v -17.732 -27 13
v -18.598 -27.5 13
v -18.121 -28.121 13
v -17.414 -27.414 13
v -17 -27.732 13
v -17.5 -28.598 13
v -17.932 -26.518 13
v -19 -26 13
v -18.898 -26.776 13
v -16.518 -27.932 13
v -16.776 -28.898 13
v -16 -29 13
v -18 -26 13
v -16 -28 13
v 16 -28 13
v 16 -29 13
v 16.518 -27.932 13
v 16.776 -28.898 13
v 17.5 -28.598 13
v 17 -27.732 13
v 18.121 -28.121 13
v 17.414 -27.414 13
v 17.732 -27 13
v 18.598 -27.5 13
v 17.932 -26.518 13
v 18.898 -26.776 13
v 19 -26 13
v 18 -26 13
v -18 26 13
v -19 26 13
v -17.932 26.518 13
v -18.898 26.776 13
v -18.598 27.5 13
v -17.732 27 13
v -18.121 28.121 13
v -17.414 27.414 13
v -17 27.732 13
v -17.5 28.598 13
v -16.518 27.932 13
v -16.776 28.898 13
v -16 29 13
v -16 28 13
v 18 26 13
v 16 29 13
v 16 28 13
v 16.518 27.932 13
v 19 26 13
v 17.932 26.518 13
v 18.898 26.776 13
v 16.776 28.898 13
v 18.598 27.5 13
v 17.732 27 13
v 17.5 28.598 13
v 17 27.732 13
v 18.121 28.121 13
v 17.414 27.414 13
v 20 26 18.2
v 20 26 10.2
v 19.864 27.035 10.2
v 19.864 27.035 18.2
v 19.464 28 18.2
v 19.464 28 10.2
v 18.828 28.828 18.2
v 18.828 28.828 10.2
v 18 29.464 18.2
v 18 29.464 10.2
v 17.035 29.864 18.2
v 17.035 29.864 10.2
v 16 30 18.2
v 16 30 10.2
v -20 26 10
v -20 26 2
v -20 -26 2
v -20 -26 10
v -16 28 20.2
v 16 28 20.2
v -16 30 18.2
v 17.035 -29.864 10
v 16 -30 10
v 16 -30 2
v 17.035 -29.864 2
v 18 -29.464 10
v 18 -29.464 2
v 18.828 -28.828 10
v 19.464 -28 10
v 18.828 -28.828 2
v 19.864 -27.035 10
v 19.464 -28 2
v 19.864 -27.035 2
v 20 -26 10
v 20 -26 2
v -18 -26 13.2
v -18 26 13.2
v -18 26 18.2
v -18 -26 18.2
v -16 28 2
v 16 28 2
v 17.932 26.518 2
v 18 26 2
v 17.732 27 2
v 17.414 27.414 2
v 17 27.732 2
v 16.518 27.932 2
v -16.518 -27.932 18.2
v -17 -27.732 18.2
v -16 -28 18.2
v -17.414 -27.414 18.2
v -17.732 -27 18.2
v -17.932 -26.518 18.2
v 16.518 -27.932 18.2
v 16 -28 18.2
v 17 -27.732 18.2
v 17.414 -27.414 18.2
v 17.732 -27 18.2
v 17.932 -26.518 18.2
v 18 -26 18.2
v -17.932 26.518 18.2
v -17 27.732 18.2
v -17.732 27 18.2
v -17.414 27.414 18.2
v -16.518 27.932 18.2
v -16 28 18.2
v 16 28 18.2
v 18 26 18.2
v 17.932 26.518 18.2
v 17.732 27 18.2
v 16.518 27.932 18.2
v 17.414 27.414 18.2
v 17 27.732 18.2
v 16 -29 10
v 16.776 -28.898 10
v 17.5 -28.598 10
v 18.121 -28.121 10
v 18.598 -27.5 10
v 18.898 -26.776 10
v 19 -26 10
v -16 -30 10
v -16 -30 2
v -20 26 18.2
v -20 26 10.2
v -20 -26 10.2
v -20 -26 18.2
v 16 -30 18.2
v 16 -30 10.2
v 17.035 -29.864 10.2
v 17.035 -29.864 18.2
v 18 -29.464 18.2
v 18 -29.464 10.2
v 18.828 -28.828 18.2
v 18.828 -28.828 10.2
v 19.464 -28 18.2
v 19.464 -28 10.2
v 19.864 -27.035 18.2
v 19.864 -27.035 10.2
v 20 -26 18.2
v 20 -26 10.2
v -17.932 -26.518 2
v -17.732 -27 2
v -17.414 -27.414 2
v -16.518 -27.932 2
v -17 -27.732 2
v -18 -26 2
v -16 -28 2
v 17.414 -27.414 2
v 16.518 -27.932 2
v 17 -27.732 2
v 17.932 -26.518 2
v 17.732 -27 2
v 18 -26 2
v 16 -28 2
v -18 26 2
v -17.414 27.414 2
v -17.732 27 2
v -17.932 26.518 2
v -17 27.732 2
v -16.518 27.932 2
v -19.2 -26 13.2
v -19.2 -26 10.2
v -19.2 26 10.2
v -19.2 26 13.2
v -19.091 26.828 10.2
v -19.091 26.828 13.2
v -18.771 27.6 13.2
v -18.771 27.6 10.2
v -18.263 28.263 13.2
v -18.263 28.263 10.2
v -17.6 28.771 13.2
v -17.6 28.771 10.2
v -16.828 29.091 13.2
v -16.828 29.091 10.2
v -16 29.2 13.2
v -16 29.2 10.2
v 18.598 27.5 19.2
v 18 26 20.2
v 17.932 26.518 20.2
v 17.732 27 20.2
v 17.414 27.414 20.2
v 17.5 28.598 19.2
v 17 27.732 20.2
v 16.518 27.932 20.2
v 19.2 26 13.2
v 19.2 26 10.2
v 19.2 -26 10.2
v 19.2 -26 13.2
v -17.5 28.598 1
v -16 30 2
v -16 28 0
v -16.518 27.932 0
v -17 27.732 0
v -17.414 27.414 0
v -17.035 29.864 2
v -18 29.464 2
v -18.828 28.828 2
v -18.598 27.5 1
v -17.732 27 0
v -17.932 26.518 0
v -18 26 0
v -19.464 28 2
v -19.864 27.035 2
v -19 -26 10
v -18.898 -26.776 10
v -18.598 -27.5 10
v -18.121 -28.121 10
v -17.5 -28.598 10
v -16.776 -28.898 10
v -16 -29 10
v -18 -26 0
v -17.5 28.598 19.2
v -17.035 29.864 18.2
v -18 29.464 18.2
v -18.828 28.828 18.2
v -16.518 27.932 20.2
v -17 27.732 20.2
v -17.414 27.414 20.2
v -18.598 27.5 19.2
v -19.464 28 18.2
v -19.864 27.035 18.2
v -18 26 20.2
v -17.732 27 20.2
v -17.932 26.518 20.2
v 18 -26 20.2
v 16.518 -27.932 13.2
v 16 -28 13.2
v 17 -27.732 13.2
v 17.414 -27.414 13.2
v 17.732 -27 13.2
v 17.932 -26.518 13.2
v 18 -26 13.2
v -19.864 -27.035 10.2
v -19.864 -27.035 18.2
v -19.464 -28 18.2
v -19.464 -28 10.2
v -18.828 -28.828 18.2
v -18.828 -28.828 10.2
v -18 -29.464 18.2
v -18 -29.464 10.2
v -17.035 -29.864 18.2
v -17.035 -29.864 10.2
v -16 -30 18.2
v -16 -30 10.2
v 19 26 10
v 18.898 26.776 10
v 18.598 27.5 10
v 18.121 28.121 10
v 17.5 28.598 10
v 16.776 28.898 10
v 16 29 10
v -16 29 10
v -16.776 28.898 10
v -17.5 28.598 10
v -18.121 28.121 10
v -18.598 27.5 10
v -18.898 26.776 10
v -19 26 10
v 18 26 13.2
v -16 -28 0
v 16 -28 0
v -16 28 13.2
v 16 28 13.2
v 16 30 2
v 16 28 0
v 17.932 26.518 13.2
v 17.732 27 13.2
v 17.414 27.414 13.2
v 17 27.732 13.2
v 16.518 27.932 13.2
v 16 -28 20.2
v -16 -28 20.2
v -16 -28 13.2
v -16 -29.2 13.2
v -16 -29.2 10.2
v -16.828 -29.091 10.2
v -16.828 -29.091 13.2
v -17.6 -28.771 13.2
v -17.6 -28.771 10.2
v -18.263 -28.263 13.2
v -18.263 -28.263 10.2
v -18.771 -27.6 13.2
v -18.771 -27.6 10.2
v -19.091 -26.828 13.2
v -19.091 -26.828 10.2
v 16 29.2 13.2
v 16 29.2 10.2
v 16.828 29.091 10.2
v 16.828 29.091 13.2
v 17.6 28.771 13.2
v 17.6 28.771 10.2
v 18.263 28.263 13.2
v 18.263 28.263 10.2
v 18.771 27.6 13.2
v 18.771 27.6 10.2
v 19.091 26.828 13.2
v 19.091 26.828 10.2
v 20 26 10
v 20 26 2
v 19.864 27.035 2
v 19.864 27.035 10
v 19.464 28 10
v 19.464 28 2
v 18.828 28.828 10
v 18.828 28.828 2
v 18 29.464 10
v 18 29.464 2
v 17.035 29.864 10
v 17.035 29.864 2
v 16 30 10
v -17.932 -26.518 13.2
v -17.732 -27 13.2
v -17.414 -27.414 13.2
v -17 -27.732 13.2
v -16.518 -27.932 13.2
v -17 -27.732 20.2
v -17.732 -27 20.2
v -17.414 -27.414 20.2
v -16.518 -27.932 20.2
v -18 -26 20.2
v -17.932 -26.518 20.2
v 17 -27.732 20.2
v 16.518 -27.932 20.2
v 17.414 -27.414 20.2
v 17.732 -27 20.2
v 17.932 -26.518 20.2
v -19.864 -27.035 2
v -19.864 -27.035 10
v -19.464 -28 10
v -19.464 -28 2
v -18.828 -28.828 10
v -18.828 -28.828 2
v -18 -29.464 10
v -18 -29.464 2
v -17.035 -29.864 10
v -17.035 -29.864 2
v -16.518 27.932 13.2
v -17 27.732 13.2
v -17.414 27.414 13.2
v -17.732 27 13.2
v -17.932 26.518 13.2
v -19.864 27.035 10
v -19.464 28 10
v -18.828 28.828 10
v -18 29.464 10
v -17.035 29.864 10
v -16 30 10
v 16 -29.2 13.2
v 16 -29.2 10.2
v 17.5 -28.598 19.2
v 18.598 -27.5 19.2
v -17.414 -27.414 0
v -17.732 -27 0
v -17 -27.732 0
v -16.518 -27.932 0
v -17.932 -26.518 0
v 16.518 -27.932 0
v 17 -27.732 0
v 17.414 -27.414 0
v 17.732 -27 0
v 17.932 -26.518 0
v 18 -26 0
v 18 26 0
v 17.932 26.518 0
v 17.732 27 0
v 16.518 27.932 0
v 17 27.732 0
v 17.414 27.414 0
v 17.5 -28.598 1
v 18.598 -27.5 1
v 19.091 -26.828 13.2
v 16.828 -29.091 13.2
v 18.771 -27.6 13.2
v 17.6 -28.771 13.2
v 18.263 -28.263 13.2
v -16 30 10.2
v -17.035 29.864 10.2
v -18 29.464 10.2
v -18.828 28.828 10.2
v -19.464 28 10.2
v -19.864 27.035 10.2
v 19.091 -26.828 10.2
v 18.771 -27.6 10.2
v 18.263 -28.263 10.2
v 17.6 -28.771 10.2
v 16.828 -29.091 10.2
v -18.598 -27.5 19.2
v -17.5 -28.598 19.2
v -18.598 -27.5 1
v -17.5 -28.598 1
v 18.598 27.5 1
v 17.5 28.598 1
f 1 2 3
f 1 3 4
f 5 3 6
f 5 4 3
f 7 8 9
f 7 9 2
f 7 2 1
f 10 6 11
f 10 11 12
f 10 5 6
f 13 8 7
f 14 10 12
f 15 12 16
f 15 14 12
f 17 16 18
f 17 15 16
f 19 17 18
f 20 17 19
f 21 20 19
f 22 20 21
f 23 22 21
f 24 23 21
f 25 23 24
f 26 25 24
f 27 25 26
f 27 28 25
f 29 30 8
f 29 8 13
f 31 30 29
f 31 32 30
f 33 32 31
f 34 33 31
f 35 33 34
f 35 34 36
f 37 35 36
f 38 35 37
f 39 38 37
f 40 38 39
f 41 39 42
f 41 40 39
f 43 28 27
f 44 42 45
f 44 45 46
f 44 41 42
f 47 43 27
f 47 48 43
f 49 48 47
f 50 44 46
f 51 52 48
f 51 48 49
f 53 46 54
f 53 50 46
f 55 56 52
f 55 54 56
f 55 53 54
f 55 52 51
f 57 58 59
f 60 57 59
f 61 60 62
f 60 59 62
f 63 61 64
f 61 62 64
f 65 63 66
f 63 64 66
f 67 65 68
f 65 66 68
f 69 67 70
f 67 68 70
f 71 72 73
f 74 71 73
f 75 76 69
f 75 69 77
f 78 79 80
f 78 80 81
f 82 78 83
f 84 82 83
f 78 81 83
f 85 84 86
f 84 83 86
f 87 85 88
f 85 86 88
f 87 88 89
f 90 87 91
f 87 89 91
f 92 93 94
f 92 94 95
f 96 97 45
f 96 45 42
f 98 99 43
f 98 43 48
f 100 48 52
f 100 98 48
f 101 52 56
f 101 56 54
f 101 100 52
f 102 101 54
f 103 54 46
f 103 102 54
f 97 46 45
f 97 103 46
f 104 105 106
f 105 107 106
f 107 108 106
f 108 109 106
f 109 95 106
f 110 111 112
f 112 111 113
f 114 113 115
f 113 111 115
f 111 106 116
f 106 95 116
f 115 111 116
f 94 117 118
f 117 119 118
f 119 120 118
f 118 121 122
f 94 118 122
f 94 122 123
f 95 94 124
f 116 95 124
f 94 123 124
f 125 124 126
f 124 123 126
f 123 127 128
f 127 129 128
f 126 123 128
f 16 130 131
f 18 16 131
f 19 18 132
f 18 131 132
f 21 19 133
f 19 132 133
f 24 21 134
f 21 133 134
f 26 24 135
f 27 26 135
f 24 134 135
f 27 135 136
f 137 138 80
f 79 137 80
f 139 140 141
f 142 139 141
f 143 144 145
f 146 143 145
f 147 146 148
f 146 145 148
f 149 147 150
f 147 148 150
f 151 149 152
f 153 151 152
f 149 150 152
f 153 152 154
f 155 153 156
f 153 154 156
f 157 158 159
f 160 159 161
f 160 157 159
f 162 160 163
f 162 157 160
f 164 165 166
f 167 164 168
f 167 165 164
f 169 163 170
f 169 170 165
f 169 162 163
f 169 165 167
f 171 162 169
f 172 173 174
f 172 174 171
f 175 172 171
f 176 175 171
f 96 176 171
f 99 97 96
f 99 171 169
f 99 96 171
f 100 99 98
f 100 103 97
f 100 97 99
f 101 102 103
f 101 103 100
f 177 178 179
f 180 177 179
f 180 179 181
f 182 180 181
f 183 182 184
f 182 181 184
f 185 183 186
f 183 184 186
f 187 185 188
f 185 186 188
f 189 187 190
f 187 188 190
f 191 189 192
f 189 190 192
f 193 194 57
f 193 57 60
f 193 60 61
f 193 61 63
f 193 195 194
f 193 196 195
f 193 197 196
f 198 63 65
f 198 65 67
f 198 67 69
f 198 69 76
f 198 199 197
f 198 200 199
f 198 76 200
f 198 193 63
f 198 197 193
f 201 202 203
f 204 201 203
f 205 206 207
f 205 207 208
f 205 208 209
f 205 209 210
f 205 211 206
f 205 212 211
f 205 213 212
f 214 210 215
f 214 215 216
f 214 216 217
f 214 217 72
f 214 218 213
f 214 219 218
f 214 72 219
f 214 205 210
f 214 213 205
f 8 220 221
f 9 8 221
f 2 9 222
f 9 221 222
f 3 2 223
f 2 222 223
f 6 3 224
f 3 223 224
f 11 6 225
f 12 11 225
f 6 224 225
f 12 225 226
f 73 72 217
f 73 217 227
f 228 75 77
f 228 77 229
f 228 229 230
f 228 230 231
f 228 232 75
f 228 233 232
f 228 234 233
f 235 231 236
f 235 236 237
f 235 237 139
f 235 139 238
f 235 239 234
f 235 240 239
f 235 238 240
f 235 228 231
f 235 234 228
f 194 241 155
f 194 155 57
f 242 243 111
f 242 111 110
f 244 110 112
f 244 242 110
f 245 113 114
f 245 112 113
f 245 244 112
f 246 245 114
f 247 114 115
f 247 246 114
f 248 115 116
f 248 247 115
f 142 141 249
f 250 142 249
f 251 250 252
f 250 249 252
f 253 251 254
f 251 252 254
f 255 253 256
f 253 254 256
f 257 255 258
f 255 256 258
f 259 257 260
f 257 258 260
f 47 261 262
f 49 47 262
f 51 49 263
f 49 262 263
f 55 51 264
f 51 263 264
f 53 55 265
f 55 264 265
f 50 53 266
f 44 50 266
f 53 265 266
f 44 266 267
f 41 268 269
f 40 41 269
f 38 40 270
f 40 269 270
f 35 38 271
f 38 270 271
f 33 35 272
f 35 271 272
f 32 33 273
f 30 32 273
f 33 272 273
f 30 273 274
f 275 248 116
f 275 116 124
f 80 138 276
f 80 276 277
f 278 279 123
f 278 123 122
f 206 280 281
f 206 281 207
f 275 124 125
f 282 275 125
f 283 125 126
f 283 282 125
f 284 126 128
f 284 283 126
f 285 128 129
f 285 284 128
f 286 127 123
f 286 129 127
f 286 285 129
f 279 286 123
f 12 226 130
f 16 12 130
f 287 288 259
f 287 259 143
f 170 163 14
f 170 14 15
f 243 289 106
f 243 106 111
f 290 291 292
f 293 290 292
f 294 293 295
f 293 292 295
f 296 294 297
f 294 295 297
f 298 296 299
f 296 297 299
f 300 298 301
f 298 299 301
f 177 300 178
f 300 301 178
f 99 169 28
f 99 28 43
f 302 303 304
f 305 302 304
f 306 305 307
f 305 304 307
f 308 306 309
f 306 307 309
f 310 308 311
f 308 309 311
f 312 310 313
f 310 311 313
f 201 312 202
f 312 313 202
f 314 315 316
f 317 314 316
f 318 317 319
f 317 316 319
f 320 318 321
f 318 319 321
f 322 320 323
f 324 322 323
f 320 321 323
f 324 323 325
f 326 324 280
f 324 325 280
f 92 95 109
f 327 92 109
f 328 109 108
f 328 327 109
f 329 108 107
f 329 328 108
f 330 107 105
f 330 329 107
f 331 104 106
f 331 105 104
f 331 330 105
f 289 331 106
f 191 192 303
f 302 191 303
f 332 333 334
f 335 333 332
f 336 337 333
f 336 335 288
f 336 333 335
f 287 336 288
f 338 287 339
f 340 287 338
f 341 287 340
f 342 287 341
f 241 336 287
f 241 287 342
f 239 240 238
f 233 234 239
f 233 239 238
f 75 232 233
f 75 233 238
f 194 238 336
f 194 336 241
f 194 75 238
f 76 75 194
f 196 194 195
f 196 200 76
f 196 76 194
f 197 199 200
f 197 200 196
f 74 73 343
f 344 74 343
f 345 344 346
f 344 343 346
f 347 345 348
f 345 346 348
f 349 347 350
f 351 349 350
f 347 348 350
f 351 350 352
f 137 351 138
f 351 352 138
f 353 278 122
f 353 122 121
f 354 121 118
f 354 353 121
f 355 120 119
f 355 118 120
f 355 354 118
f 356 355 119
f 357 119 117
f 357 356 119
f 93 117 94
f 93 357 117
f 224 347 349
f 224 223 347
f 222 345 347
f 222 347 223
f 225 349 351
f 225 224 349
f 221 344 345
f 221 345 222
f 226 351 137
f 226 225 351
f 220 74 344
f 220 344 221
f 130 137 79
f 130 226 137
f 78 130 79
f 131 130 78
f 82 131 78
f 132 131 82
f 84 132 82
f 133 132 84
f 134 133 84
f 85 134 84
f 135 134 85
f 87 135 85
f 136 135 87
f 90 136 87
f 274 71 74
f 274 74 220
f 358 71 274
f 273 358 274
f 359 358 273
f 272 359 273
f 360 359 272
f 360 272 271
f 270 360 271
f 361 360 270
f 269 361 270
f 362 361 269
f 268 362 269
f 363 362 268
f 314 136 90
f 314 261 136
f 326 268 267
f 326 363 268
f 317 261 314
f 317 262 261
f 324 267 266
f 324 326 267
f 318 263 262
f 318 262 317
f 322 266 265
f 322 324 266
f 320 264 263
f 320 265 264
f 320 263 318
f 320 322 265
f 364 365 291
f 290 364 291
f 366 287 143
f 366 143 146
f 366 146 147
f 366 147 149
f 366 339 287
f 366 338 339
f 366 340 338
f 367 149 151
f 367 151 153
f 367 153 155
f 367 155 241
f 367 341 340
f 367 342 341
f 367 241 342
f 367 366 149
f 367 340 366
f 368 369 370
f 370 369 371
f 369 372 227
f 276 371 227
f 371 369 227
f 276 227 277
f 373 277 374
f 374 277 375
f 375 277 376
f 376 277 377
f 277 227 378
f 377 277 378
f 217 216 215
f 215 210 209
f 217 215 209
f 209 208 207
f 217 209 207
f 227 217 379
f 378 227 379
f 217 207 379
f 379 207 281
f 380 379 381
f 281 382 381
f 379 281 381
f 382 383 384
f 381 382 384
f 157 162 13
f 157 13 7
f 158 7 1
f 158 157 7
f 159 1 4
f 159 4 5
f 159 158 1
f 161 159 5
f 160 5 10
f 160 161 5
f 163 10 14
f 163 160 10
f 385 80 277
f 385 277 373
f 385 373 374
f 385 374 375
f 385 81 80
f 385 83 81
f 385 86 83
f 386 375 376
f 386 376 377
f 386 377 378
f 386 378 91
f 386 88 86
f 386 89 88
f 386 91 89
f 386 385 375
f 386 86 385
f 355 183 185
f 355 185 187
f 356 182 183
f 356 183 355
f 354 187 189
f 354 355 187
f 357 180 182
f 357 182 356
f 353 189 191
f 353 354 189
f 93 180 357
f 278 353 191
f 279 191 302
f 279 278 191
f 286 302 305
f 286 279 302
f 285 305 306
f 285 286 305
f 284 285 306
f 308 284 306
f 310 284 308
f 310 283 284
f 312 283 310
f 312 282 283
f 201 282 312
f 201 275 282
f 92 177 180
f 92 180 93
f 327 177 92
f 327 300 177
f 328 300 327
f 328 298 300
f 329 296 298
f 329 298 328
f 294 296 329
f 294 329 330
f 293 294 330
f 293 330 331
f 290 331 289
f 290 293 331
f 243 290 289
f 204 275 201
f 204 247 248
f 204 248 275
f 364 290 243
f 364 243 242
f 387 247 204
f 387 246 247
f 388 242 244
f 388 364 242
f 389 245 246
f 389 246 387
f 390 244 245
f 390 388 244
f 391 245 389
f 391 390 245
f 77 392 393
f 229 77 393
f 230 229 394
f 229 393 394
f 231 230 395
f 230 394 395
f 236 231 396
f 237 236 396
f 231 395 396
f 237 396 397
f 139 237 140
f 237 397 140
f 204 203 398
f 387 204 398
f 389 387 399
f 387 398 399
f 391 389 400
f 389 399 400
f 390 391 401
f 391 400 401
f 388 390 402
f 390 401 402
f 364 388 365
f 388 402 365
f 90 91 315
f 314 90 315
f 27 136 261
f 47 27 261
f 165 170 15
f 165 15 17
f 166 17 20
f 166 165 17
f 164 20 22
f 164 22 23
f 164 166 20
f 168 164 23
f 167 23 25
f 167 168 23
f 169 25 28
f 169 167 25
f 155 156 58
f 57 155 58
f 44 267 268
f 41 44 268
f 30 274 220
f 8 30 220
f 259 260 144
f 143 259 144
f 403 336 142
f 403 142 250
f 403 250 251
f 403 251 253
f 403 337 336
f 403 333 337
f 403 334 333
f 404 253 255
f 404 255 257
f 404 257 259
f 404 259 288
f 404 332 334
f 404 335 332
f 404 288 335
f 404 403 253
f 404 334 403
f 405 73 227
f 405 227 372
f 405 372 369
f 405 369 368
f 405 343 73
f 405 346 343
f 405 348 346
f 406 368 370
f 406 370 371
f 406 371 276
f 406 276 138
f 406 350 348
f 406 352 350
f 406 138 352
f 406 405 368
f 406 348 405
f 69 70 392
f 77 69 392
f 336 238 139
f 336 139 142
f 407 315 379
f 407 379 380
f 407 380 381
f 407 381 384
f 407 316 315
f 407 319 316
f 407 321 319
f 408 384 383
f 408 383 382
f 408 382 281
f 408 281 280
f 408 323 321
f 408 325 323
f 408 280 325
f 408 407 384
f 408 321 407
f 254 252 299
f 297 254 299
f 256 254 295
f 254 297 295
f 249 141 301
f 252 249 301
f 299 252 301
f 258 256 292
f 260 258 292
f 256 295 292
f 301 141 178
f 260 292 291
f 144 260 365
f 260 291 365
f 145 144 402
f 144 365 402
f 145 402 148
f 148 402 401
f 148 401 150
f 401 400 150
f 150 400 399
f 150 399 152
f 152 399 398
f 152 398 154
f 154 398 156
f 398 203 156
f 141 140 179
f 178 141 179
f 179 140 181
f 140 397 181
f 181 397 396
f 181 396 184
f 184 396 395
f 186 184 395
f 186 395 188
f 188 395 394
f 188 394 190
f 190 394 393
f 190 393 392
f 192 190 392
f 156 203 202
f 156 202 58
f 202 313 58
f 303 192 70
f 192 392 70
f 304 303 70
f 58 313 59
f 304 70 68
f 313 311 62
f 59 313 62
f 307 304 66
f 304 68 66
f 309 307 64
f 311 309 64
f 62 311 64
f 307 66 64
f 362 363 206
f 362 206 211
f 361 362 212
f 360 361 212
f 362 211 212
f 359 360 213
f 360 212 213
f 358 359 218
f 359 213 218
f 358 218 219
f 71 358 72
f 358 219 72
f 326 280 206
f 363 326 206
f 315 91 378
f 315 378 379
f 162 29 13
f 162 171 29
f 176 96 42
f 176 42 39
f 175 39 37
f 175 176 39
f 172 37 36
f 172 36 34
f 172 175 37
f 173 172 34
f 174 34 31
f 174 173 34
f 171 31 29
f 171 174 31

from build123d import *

# Parameters (mm, degrees)
PAD_DEPTH       = 10
PAD001_DEPTH    = 3
POCKET_DEPTH    = 8
CHAMFER001_SIZE = 2
PAD002_DEPTH    = 10
THICKNESS_T     = -2
POCKET001_DEPTH = 3
CHAMFER_SIZE    = 2


with BuildPart() as base:
    # Sketch → Pad (new body)
    with BuildSketch(Plane.XY):
        with BuildLine():
            Line((-20, 26), (-20, -26))
            ThreePointArc((-20, -26), (-18.828427, -28.828427), (-16, -30))
            Line((-16, -30), (16, -30))
            ThreePointArc((16, -30), (18.828427, -28.828427), (20, -26))
            Line((20, -26), (20, 26))
            ThreePointArc((20, 26), (18.828427, 28.828427), (16, 30))
            Line((16, 30), (-16, 30))
            ThreePointArc((-16, 30), (-18.828427, 28.828427), (-20, 26))
        make_face()
    extrude(amount=PAD_DEPTH)

    # Sketch001 → Pad001 (join)
    with BuildSketch(Plane.XY.offset(10)):
        with BuildLine():
            Line((-19, 26), (-19, -26))
            ThreePointArc((-19, -26), (-18.12132, -28.12132), (-16, -29))
            Line((-16, -29), (16, -29))
            ThreePointArc((16, -29), (18.12132, -28.12132), (19, -26))
            Line((19, -26), (19, 26))
            ThreePointArc((19, 26), (18.12132, 28.12132), (16, 29))
            Line((16, 29), (-16, 29))
            ThreePointArc((-16, 29), (-18.12132, 28.12132), (-19, 26))
        make_face()
        with BuildLine():
            Line((-18, 26), (-18, -26))
            ThreePointArc((-18, -26), (-17.414214, -27.414214), (-16, -28))
            Line((-16, -28), (16, -28))
            ThreePointArc((16, -28), (17.414214, -27.414214), (18, -26))
            Line((18, -26), (18, 26))
            ThreePointArc((18, 26), (17.414214, 27.414214), (16, 28))
            Line((16, 28), (-16, 28))
            ThreePointArc((-16, 28), (-17.414214, 27.414214), (-18, 26))
        make_face(mode=Mode.SUBTRACT)
    extrude(amount=PAD001_DEPTH)

    # Sketch002 (on Face28 of Pad001) → Pocket (cut)
    with BuildSketch(Plane.XY.offset(10)):
        with BuildLine():
            Line((18, -26), (18, 26))
            ThreePointArc((18, 26), (17.414214, 27.414214), (16, 28))
            Line((16, 28), (-16, 28))
            ThreePointArc((-16, 28), (-17.414214, 27.414214), (-18, 26))
            Line((-18, 26), (-18, -26))
            ThreePointArc((-18, -26), (-17.414214, -27.414214), (-16, -28))
            Line((-16, -28), (16, -28))
            ThreePointArc((16, -28), (17.414214, -27.414214), (18, -26))
        make_face()
    extrude(amount=-POCKET_DEPTH, mode=Mode.SUBTRACT)

    # Chamfer001
    chamfer001_edges = [base.edges().sort_by_distance(p)[0] for p in [
        (-18.828427, -28.828427, 0),
        (0, -30, 0),
        (18.828427, -28.828427, 0),
        (20, 0, 0),
        (18.828427, 28.828427, 0),
        (0, 30, 0),
        (-18.828427, 28.828427, 0),
        (-20, 0, 0),
    ]]
    chamfer(chamfer001_edges, length=CHAMFER001_SIZE)


with BuildPart() as lid:
    # Sketch003 → Pad002 (new body)
    with BuildSketch(Plane.XY.offset(10.2)):
        with BuildLine():
            Line((-20, 26), (-20, -26))
            ThreePointArc((-20, -26), (-18.828427, -28.828427), (-16, -30))
            Line((-16, -30), (16, -30))
            ThreePointArc((16, -30), (18.828427, -28.828427), (20, -26))
            Line((20, -26), (20, 26))
            ThreePointArc((20, 26), (18.828427, 28.828427), (16, 30))
            Line((16, 30), (-16, 30))
            ThreePointArc((-16, 30), (-18.828427, 28.828427), (-20, 26))
        make_face()
    extrude(amount=PAD002_DEPTH)

    # Thickness
    thickness_openings = [lid.faces().sort_by_distance(p)[0] for p in [
        (0, 0, 10.2),
    ]]
    offset(amount=THICKNESS_T, openings=thickness_openings)

    # Sketch004 (on Face10 of Thickness) → Pocket001 (cut)
    with BuildSketch(Plane(origin=(0, 0, 10.2), x_dir=(1, 0, 0), z_dir=(0, 0, -1))):
        with BuildLine():
            Line((-19.2, 26), (-19.2, -26))
            ThreePointArc((-19.2, -26), (-18.262742, -28.262742), (-16, -29.2))
            Line((-16, -29.2), (16, -29.2))
            ThreePointArc((16, -29.2), (18.262742, -28.262742), (19.2, -26))
            Line((19.2, -26), (19.2, 26))
            ThreePointArc((19.2, 26), (18.262742, 28.262742), (16, 29.2))
            Line((16, 29.2), (-16, 29.2))
            ThreePointArc((-16, 29.2), (-18.262742, 28.262742), (-19.2, 26))
        make_face()
    extrude(amount=-POCKET001_DEPTH, mode=Mode.SUBTRACT)

    # Chamfer
    chamfer_edges = [lid.edges().sort_by_distance(p)[0] for p in [
        (-20, 0, 20.2),
        (-18.828427, -28.828427, 20.2),
        (0, -30, 20.2),
        (18.828427, -28.828427, 20.2),
        (20, 0, 20.2),
        (18.828427, 28.828427, 20.2),
        (0, 30, 20.2),
        (-18.828427, 28.828427, 20.2),
    ]]
    chamfer(chamfer_edges, length=CHAMFER_SIZE)


solid = Compound([base.part, lid.part])
